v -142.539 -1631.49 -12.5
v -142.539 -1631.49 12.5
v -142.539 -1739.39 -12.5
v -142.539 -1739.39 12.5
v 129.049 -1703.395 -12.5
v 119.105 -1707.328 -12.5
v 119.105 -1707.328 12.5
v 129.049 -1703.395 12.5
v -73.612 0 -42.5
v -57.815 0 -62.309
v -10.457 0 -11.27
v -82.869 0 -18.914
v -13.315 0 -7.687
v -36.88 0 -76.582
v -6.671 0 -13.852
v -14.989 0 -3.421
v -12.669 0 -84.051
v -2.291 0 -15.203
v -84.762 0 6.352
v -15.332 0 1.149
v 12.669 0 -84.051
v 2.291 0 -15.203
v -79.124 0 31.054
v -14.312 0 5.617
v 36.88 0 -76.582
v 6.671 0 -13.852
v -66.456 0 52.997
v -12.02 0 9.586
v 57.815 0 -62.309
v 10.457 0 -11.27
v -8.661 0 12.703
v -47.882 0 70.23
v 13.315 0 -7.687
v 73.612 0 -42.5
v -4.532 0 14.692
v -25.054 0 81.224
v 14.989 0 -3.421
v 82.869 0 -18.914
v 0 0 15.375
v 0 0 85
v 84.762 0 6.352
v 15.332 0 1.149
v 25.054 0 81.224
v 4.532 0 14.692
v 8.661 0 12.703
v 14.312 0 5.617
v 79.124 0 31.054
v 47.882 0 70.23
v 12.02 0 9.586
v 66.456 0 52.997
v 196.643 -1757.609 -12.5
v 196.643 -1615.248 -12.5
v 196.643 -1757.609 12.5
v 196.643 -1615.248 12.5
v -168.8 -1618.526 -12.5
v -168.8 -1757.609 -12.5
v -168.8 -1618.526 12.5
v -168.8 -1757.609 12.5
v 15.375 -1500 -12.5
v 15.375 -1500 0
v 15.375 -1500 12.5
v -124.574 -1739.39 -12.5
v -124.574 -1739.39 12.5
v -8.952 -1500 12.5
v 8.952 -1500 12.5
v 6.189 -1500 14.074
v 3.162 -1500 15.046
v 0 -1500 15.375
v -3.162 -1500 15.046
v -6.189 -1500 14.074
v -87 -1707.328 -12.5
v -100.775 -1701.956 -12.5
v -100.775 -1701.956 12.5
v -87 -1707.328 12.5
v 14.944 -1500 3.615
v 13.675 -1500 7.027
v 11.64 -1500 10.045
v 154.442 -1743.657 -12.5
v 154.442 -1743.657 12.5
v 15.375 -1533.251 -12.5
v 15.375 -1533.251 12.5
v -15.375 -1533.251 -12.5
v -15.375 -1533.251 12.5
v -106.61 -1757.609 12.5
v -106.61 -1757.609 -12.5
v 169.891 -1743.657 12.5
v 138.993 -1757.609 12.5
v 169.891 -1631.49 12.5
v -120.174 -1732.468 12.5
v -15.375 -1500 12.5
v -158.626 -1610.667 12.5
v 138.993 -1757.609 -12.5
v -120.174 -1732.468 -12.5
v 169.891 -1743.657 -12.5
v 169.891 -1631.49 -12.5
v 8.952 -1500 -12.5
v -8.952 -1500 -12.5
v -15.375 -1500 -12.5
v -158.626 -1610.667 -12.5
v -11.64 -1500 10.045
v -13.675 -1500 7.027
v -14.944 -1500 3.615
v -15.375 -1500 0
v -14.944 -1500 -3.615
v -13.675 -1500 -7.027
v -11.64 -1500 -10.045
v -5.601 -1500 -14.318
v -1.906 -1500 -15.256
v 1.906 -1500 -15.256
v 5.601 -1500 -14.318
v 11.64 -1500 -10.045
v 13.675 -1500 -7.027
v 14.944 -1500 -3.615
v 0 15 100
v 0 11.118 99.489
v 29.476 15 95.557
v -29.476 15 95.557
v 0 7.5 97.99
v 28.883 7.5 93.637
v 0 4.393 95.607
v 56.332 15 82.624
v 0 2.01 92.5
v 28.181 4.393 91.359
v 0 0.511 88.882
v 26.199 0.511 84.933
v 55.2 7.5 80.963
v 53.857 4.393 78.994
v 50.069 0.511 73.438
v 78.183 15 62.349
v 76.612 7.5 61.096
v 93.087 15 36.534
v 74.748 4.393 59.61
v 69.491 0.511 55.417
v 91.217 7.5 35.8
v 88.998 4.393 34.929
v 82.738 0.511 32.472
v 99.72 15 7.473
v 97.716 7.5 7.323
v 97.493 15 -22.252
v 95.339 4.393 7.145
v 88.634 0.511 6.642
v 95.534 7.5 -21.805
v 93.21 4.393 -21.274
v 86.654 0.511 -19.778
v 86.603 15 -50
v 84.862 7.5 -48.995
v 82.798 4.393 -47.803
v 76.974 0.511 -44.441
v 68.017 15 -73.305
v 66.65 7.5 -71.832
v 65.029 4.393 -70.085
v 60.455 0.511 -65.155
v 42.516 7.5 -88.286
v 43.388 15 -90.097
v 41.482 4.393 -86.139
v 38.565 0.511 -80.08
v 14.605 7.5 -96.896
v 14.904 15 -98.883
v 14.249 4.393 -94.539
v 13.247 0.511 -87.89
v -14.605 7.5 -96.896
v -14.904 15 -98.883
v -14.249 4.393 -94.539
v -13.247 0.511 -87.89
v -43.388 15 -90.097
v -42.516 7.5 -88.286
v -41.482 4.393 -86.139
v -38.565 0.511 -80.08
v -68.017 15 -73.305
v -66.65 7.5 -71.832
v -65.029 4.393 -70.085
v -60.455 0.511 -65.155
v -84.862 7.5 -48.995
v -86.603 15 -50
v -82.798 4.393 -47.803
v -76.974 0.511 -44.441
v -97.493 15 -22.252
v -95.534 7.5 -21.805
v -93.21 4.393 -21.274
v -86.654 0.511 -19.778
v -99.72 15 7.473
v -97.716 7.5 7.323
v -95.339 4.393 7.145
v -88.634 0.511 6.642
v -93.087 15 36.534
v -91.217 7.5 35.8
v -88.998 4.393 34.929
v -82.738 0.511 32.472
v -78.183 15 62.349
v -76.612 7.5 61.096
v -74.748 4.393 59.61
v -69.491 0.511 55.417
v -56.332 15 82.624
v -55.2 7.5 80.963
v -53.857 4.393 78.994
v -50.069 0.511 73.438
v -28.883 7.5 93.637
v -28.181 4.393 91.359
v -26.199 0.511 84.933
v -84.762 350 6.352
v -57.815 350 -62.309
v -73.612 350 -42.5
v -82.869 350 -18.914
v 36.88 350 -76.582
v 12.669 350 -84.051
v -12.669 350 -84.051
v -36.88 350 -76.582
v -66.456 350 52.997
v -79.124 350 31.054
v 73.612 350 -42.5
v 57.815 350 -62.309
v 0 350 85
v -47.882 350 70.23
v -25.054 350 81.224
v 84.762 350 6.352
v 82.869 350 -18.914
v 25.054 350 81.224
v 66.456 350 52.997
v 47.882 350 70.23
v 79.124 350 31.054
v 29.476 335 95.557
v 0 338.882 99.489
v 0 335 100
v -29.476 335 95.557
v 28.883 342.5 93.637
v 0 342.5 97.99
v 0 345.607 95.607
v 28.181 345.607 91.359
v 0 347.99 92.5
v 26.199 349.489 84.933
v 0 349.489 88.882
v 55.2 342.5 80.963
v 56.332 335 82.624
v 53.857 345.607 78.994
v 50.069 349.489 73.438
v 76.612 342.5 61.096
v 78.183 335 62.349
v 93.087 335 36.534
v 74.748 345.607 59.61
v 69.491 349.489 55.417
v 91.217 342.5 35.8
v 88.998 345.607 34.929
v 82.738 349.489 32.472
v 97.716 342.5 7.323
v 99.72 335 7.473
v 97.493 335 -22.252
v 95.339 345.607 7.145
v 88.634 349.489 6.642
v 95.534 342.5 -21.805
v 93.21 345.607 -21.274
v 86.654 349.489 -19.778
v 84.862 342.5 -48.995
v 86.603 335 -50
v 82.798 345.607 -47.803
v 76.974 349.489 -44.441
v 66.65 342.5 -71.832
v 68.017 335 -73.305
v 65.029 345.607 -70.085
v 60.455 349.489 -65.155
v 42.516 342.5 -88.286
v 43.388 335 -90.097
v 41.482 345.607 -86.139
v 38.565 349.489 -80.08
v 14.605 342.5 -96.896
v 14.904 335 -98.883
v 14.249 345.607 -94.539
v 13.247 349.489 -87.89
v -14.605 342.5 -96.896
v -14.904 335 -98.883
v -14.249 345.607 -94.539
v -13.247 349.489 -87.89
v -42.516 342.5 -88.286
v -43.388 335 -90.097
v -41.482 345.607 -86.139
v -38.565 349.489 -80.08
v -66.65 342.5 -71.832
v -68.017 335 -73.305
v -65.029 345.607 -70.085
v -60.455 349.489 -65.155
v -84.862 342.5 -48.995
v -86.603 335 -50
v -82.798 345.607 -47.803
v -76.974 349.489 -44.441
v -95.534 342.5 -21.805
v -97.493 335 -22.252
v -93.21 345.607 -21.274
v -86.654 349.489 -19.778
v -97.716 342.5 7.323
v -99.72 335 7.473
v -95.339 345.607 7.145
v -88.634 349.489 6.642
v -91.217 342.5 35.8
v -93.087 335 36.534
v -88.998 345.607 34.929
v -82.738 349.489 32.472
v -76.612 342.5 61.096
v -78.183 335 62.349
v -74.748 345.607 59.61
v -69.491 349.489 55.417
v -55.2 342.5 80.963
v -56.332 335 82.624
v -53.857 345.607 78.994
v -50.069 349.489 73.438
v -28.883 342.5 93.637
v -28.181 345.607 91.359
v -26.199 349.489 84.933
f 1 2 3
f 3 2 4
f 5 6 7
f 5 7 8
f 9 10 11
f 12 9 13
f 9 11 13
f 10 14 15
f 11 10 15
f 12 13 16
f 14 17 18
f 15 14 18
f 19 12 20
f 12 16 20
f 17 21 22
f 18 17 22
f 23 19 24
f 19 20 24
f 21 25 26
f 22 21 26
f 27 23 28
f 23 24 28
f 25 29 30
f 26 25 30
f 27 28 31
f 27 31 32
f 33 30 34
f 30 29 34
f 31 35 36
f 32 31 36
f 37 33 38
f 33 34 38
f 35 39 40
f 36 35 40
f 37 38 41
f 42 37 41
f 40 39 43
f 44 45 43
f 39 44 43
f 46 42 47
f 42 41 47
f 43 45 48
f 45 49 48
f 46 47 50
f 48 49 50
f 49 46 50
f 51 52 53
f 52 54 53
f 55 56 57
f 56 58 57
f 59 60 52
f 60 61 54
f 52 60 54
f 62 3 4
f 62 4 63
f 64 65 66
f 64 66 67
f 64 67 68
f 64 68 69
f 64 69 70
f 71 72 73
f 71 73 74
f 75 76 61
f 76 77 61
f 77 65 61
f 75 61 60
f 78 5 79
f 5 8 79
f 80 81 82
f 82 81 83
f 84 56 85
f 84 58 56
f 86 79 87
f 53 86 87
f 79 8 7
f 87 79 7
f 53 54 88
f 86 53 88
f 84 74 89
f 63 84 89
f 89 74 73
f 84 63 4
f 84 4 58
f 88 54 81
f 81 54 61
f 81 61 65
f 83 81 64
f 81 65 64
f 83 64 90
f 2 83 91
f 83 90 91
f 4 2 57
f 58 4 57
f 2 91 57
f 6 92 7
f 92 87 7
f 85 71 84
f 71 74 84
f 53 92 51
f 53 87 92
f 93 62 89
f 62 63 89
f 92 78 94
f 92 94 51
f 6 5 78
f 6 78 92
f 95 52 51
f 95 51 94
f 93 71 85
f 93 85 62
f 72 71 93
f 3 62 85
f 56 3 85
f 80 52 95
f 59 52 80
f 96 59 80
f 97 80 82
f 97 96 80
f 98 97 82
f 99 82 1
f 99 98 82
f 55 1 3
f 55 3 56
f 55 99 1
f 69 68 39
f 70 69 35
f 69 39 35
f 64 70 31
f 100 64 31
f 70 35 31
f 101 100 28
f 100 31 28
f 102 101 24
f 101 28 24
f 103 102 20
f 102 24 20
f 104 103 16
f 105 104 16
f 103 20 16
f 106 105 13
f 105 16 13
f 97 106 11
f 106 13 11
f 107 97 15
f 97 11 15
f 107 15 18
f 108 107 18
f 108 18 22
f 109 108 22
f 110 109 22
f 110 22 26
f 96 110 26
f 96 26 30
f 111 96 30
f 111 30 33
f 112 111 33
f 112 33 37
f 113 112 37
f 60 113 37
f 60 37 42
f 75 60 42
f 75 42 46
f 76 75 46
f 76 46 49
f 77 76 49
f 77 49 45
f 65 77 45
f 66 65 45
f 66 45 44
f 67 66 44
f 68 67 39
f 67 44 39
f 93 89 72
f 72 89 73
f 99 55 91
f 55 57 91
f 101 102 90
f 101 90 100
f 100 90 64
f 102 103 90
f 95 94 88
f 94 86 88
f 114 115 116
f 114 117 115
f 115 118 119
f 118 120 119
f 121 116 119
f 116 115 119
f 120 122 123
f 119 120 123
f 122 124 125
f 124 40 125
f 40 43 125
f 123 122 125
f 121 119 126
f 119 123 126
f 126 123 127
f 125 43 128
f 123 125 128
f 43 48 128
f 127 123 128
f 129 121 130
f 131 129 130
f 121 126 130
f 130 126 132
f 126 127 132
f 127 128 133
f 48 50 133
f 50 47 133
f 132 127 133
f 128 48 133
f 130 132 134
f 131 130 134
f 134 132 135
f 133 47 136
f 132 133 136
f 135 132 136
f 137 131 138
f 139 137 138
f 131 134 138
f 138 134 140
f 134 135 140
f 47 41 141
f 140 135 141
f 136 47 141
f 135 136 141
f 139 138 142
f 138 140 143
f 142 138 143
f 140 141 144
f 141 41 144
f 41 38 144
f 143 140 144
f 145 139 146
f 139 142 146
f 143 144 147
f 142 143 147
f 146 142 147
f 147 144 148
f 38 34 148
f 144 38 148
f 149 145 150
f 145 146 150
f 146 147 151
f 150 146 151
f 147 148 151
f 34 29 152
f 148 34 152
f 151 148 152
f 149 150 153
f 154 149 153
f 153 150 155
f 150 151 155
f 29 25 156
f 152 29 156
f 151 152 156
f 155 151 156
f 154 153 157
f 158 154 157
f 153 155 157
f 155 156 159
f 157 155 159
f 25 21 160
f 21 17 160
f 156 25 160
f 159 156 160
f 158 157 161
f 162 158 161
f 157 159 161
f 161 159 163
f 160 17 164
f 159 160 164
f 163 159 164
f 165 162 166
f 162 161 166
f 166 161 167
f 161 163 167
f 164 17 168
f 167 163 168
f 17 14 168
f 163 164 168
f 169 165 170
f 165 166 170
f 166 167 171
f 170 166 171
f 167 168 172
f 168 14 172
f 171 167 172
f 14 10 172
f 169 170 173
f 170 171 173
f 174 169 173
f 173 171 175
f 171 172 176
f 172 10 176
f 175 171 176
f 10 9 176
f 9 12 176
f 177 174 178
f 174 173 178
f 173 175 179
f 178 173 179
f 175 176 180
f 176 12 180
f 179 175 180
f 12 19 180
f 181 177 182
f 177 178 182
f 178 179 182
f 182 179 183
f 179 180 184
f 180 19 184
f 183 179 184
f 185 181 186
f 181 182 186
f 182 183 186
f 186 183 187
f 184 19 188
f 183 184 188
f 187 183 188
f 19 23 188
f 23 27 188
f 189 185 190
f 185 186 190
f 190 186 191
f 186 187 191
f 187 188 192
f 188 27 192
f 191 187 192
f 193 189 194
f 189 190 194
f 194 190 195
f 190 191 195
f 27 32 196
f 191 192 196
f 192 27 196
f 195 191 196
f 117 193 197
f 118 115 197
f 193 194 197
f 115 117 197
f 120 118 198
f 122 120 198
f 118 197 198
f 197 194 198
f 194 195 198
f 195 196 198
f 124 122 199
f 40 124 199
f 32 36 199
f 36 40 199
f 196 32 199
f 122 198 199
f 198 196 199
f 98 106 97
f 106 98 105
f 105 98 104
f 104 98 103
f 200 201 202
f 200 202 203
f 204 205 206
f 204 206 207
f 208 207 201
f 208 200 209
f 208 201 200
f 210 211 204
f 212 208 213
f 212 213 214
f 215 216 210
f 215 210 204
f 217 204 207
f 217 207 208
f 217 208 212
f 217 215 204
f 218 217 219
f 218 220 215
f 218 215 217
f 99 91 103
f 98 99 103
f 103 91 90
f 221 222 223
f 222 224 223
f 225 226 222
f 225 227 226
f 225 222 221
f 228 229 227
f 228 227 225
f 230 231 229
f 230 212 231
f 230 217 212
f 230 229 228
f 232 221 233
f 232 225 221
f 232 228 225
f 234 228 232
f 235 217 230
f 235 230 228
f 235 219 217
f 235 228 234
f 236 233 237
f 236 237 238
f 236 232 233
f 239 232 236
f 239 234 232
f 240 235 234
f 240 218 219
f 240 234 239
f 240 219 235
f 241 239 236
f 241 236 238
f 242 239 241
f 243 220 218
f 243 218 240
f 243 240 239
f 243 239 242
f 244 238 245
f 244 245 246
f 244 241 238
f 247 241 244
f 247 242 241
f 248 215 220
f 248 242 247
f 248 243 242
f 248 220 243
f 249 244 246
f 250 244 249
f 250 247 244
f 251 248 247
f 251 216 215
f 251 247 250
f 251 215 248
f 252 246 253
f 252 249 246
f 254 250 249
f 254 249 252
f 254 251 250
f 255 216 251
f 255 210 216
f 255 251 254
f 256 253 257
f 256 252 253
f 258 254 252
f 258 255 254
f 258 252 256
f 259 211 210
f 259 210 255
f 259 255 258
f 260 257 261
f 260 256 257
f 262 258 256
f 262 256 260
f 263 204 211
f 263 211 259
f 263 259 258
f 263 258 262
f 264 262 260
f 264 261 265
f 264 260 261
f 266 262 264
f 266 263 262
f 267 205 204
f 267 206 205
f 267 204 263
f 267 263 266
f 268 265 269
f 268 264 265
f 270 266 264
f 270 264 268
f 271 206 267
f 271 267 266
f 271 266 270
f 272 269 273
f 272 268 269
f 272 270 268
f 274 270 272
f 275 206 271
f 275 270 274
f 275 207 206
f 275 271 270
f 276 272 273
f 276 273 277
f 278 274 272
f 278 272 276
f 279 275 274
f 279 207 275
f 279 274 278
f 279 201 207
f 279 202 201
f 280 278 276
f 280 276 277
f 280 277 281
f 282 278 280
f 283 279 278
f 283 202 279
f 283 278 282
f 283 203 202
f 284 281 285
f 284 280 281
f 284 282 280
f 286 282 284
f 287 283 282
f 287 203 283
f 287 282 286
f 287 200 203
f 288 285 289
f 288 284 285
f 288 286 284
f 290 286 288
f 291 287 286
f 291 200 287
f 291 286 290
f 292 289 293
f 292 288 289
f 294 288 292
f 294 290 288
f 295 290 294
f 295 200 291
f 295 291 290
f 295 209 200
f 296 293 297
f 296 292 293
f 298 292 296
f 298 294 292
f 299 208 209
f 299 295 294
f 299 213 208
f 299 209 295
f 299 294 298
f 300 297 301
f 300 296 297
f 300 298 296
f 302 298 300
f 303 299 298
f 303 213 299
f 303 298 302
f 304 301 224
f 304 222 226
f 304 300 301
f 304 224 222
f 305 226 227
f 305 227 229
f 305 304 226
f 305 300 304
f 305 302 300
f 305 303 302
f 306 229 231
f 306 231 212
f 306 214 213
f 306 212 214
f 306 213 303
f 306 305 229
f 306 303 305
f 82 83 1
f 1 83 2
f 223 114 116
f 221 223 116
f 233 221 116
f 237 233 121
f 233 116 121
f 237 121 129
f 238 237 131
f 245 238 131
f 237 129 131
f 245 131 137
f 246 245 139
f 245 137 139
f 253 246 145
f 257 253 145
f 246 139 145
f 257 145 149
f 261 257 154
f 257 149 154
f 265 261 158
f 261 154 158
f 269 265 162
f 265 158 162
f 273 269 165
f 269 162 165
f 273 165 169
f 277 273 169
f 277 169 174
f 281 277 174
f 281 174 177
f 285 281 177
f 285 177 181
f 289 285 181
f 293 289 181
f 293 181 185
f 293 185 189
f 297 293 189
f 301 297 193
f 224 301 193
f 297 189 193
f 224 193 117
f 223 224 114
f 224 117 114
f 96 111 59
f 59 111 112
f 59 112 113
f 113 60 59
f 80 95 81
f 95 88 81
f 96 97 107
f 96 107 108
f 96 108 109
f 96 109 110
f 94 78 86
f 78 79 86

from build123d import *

# Parameters (mm, degrees)
CROQUIS1_R              = 100
SALIENTE_EXTRUIR1_DEPTH = 350
REDONDEO1_R             = 15
CROQUIS2_R              = 15.374662703
SALIENTE_EXTRUIR2_DEPTH = 1500
SALIENTE_EXTRUIR3_DEPTH = 12.5


with BuildPart() as part:
    # Croquis1 → Saliente-Extruir1 (new body)
    with BuildSketch(Plane(origin=(0, 0, 0), x_dir=(1, 0, 0), z_dir=(0, 1, 0))):
        with Locations(Location((0, 0, 0), (0, 0, 270))):
            Circle(CROQUIS1_R)
    extrude(amount=SALIENTE_EXTRUIR1_DEPTH)

    # Redondeo1
    redondeo1_edges = [part.edges().sort_by_distance(p)[0] for p in [
        (0, 0, -100),
        (0, 350, -100),
    ]]
    fillet(redondeo1_edges, radius=REDONDEO1_R)

    # Croquis2 → Saliente-Extruir2 (add)
    with BuildSketch(Plane.XZ):
        with Locations(Location((0, 0, 0), (0, 0, 90))):
            Circle(CROQUIS2_R)
    extrude(amount=SALIENTE_EXTRUIR2_DEPTH)

    # Croquis3 → Saliente-Extruir3 (add, symmetric)
    with BuildSketch(Plane.XY):
        Polygon((15.374662703, -1500), (196.643299481, -1615.247729776), (196.643299481, -1757.608907892), (169.890863325, -1757.608907892), (138.99299414, -1757.608907892), (119.105323431, -1707.327980329), (129.049158786, -1703.39488417), (154.441928733, -1743.657312209), (169.890863325, -1743.657312209), (169.890863325, -1631.4902803), (15.374662703, -1533.251325939), (-15.374662703, -1533.251325939), (-142.53937321, -1631.4902803), (-142.53937321, -1739.389775564), (-124.574455385, -1739.389775564), (-120.173982412, -1732.468444111), (-100.774753954, -1701.956158064), (-87.000489723, -1707.327980329), (-106.60953756, -1757.608907892), (-142.53937321, -1757.608907892), (-168.799765014, -1757.608907892), (-168.799765014, -1618.525977557), (-158.626316744, -1610.66665152), (-15.374662703, -1500), align=None)
    extrude(amount=SALIENTE_EXTRUIR3_DEPTH, both=True)


solid = part.part
